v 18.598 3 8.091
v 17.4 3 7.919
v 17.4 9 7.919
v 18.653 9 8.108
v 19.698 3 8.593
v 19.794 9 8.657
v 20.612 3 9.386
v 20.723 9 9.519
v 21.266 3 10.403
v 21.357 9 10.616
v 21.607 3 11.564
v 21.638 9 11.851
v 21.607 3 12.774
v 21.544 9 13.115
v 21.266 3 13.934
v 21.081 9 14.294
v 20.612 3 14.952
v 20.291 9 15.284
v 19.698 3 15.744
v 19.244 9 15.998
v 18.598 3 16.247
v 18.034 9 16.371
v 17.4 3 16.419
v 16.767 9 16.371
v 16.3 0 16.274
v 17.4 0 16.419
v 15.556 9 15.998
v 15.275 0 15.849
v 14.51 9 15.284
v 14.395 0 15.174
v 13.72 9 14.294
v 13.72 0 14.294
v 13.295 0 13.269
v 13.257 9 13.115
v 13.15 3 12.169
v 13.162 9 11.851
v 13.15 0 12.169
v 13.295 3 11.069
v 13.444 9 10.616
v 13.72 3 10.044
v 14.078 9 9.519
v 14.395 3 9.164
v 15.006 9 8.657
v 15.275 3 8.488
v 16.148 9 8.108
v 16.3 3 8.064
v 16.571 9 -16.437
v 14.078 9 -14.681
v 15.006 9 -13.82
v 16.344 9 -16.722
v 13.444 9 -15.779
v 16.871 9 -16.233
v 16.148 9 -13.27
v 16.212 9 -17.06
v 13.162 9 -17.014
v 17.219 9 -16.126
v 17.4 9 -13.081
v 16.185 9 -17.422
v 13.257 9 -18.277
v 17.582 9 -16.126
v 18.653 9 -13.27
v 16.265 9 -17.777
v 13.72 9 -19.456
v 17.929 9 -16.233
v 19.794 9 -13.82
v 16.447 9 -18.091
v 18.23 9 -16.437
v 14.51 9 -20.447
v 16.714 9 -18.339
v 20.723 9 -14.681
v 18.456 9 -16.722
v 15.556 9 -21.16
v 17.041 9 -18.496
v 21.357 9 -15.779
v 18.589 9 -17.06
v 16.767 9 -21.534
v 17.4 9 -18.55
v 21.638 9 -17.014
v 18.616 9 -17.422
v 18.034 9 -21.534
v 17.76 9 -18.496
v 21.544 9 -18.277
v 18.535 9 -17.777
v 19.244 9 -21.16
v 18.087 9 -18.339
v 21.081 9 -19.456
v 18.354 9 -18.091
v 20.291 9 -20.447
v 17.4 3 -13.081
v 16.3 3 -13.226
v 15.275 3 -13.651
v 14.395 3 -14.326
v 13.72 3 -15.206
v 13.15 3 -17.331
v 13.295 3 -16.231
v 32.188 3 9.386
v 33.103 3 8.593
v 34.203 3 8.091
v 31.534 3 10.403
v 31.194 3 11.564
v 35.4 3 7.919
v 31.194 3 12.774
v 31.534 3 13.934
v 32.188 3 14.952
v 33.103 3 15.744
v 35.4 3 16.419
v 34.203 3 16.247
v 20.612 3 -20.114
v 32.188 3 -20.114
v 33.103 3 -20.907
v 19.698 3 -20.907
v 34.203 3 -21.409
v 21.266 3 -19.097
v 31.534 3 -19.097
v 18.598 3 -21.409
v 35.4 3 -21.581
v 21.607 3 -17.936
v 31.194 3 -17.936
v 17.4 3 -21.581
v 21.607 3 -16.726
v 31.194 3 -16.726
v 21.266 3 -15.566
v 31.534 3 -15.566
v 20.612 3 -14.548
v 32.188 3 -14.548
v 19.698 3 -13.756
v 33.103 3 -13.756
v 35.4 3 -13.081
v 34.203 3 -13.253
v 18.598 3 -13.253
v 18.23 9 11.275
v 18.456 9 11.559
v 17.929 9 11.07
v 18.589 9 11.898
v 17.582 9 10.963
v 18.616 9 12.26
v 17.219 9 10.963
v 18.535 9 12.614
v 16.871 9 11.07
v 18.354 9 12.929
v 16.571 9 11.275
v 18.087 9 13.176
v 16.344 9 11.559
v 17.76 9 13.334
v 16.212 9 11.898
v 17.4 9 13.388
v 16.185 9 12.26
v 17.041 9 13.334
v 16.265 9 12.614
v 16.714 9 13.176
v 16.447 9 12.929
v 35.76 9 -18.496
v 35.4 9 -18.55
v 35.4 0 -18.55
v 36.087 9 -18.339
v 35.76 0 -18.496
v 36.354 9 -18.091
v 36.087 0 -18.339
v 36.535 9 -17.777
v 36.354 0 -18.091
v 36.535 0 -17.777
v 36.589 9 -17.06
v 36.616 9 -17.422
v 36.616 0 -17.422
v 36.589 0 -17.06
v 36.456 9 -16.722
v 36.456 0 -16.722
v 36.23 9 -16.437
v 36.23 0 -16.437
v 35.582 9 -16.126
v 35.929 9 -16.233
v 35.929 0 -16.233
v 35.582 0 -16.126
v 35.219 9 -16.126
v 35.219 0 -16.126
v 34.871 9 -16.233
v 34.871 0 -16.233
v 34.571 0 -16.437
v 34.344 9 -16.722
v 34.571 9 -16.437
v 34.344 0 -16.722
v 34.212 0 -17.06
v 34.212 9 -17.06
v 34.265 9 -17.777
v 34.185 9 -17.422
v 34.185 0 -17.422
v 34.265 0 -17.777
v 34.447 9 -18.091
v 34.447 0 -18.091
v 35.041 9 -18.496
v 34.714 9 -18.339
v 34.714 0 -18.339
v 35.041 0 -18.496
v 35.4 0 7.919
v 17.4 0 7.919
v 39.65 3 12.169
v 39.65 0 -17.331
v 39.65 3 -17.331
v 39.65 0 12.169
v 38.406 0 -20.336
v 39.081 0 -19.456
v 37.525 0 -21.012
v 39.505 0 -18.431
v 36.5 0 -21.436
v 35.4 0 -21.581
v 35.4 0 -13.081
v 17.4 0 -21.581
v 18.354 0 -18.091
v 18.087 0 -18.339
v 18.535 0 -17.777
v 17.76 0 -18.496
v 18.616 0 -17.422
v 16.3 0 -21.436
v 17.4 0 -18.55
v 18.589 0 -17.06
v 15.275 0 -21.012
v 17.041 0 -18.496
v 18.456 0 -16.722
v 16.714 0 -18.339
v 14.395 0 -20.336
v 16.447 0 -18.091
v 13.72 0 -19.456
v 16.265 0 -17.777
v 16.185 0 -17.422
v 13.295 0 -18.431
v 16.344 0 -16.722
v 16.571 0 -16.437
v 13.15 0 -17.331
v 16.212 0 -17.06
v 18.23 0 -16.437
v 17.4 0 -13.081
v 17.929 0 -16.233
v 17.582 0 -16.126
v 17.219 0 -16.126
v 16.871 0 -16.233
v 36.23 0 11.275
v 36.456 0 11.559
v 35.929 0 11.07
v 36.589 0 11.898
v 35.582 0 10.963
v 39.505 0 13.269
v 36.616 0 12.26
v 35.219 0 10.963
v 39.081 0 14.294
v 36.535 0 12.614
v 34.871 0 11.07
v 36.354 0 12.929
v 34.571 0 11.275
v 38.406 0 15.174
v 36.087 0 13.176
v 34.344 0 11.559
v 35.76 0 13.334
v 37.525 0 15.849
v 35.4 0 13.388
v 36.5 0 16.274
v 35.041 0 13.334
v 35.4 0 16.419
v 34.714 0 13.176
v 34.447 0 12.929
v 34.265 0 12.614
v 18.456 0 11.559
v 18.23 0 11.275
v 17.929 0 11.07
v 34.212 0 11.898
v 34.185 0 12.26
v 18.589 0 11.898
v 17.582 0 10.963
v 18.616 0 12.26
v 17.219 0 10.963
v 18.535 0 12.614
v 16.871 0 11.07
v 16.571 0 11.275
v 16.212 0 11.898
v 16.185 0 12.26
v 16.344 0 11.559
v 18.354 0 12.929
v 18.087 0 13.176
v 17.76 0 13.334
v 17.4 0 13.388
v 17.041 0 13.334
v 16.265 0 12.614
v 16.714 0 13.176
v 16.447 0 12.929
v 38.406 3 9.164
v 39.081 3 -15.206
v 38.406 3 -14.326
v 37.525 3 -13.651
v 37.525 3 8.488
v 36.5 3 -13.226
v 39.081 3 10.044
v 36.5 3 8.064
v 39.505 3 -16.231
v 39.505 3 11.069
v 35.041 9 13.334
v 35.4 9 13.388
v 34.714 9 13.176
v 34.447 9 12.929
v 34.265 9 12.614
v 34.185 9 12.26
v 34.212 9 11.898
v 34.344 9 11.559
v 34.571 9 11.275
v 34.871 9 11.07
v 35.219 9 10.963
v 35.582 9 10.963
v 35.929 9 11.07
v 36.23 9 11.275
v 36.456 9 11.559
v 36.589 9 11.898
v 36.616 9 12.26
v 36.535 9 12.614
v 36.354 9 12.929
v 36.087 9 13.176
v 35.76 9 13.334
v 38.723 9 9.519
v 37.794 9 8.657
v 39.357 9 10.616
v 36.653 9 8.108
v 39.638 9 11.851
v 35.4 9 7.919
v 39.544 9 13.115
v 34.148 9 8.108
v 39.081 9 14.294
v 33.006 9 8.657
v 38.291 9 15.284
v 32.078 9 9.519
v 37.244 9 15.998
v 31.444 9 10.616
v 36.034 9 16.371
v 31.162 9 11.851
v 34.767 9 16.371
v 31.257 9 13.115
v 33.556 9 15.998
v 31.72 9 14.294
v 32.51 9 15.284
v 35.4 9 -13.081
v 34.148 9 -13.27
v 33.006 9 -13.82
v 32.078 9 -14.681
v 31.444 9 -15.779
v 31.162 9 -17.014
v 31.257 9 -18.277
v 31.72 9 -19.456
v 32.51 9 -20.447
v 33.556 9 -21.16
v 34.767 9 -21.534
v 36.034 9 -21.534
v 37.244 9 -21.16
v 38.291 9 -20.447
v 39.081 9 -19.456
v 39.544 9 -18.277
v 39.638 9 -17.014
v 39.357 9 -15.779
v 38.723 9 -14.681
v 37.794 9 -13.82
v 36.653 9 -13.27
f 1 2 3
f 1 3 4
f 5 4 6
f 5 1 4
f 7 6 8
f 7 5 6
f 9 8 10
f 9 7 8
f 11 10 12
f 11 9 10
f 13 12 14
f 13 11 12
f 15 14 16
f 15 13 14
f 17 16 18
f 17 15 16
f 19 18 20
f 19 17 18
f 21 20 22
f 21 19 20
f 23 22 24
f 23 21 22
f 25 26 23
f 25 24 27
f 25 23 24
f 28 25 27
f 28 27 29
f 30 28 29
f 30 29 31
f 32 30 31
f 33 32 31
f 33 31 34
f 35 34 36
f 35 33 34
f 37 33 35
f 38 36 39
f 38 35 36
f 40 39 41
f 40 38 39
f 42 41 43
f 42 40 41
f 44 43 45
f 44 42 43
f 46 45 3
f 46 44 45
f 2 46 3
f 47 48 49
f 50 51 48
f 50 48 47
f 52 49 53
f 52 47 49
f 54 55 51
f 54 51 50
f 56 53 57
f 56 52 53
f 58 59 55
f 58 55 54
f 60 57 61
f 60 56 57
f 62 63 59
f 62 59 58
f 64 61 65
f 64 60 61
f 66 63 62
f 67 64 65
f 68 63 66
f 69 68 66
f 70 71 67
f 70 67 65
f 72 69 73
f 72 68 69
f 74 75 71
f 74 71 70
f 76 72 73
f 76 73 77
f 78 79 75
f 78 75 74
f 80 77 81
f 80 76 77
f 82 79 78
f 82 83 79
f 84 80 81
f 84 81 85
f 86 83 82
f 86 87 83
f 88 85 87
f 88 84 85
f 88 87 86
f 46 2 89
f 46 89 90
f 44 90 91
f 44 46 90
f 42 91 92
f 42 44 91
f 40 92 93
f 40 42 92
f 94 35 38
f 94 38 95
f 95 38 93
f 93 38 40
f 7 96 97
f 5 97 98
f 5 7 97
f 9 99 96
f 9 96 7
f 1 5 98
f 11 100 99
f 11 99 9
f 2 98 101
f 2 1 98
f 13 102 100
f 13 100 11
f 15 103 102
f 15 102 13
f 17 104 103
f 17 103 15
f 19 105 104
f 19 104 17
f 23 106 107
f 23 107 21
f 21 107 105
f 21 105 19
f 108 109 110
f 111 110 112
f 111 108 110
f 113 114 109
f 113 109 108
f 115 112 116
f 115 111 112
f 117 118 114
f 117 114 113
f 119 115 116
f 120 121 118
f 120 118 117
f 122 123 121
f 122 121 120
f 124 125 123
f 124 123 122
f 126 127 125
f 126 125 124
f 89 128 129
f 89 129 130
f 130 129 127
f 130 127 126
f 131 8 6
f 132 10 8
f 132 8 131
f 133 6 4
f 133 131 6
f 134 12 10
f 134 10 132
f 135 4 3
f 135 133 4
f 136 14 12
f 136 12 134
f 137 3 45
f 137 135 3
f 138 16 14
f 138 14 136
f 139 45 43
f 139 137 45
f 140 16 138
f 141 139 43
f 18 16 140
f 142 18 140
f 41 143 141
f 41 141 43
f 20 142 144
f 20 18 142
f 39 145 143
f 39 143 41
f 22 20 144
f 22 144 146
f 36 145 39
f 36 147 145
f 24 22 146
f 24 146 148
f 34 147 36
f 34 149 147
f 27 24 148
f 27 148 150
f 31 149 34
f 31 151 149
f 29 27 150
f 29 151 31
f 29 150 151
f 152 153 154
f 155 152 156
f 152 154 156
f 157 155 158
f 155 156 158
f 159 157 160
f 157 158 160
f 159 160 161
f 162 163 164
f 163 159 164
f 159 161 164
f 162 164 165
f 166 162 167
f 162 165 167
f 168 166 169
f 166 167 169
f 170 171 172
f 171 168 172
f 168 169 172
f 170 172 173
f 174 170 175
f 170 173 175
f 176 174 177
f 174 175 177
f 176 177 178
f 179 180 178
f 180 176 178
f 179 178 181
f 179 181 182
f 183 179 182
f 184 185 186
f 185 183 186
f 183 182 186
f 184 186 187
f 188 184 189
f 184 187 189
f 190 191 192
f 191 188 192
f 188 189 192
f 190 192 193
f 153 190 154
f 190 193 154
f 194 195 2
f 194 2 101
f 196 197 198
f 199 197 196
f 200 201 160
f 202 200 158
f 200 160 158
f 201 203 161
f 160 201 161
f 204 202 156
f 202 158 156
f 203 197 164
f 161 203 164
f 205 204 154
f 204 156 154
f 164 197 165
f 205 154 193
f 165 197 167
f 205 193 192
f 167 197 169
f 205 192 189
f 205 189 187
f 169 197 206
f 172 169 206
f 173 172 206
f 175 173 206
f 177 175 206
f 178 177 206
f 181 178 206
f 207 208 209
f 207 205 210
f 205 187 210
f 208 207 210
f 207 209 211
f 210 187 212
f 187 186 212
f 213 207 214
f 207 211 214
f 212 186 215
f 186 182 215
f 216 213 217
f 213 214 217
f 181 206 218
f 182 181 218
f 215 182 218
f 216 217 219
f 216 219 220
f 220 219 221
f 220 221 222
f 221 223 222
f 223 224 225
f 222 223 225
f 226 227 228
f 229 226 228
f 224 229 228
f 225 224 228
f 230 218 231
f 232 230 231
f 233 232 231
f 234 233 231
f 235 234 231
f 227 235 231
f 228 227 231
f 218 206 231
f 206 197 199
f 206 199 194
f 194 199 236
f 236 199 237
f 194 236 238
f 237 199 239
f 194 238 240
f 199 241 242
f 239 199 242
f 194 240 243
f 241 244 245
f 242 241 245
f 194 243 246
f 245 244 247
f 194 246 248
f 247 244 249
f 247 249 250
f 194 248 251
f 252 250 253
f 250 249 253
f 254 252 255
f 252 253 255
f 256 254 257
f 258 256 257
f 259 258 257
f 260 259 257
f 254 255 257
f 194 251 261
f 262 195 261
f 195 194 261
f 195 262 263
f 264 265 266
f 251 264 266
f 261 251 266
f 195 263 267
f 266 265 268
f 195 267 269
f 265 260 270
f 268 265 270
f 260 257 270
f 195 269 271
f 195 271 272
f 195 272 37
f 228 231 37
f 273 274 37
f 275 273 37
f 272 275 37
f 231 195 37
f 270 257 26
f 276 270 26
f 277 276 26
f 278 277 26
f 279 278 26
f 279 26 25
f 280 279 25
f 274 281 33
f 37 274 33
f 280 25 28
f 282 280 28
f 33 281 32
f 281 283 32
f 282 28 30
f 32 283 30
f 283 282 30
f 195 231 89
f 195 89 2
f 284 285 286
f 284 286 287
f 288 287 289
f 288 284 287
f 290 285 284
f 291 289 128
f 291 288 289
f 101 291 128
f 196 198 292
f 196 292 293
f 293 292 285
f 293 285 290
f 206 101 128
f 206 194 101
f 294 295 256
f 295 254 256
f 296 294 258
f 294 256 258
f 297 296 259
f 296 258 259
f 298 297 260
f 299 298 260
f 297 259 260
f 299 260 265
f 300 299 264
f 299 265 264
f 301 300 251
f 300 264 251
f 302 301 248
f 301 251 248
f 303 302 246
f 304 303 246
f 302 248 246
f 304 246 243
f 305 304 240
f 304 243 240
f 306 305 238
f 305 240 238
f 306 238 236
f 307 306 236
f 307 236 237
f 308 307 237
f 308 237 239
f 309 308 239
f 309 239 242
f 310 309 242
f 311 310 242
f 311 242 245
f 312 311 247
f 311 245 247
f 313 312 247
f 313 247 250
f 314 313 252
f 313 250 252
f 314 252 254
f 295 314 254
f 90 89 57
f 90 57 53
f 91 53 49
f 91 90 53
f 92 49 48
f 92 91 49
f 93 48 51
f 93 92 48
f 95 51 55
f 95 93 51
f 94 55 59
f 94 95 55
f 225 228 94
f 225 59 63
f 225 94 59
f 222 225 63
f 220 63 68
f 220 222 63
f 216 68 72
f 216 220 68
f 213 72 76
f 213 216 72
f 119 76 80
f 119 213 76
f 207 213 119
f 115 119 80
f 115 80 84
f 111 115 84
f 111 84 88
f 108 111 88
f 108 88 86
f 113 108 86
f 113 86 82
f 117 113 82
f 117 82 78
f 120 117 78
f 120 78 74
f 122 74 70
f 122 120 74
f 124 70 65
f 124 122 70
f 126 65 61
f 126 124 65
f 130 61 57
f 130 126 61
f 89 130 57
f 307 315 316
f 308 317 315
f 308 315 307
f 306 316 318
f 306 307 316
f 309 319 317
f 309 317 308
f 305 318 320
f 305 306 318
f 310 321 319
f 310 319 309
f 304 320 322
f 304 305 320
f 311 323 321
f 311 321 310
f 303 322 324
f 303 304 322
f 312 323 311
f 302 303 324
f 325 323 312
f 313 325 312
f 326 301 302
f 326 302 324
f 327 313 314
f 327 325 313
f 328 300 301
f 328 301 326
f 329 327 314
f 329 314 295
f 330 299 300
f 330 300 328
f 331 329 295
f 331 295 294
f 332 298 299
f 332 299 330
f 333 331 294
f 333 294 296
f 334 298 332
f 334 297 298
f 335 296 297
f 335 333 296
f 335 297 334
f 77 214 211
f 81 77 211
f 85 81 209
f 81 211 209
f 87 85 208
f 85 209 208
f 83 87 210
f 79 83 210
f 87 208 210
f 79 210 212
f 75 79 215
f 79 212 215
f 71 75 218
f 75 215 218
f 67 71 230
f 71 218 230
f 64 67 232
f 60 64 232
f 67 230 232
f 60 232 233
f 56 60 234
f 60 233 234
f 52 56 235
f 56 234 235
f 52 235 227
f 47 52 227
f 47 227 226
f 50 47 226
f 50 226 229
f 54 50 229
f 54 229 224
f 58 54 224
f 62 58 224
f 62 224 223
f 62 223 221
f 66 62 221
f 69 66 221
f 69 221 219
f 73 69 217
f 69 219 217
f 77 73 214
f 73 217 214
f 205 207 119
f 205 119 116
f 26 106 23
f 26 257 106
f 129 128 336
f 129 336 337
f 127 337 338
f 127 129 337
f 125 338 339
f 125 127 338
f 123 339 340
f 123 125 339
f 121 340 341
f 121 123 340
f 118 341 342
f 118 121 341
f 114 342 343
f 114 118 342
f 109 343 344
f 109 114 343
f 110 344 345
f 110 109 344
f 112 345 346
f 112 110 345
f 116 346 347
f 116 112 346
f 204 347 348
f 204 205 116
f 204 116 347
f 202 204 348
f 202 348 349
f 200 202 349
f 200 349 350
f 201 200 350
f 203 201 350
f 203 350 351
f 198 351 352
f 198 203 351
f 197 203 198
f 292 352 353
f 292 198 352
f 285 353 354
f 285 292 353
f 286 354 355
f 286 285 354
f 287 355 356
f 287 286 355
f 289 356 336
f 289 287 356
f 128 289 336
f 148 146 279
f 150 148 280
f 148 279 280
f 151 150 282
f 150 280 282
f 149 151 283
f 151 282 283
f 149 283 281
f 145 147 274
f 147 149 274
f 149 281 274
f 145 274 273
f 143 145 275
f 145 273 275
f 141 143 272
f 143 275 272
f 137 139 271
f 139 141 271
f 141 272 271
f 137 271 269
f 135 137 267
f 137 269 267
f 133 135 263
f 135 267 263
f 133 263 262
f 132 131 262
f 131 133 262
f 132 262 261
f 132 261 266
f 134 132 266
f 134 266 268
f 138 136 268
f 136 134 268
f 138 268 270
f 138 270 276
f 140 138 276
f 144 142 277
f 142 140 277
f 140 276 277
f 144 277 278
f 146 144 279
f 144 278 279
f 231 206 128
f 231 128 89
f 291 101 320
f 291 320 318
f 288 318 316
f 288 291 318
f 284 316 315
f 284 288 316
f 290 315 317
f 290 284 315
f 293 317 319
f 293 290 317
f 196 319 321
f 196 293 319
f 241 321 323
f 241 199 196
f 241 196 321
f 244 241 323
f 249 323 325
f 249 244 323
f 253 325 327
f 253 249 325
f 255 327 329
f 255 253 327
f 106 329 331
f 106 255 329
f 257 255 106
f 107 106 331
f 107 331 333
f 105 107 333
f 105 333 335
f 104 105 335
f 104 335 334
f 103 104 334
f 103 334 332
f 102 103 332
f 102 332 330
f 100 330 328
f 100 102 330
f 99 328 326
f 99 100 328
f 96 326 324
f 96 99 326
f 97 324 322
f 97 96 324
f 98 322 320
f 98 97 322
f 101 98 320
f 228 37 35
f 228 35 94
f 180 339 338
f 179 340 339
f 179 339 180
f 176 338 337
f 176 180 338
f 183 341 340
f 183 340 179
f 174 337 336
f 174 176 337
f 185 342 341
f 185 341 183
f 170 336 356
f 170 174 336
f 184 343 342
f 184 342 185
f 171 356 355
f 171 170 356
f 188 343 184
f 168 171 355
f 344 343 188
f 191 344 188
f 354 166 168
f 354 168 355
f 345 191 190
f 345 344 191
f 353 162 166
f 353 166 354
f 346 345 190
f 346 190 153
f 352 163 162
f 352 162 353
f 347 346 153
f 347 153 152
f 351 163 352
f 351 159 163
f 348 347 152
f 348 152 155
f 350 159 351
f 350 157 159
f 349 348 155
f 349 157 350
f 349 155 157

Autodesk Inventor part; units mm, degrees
ref_plane "YZ Plane" through (0, 0, 0) normal (1, 0, 0) x (0, 1, 0)
ref_plane "XZ Plane" through (0, 0, 0) normal (0, 1, 0) x (-1, 0, 0)
ref_plane "XY Plane" through (0, 0, 0) normal (0, 0, 1) x (1, 0, 0)
sketch "Sketch1" plane through (0, 0, 0) normal (0, 1, 0) x (-1, 0, 0)
  arc A0 (-31.1503, 12.1688) -> (-35.4003, 7.9188) centre (-35.4003, 12.1688) ccw
  line L0 (-35.4003, 16.4188) -> (-35.4003, -2.5812)
  line L1 (-39.6503, 12.1688) -> (-31.1503, 12.1688)
  line L2 (-39.6503, -2.5812) -> (-39.6503, 12.1688)
  line L3 (-35.4003, 12.1688) -> (-26.4003, 12.1688)
  line L4 (-35.4003, 16.4188) -> (-26.4003, 16.4188)
  line L5 (-26.4003, 16.4188) -> (-26.4003, 7.9188)
  line L6 (-26.4003, 7.9188) -> (-35.4003, 7.9188)
  line L7 (-35.4003, 7.9188) -> (-35.4003, 16.4188)
  arc A1 (-35.4003, 7.9188) -> (-31.1503, 12.1688) centre (-35.4003, 12.1688) ccw
  line L8 (-35.4003, -2.5812) -> (-39.6503, -2.5812)
  point P0 (0, 0)
  dimension "d0" = 8.5
  dimension "d3" = 19
  dimension "d4" = 9
extrude "Extrusion2" add sketch "Sketch1" along normal blind 3
extrude "Extrusion3" add sketch "Sketch1" along normal blind 9 contours L1 L0 A0 | A1 L0 L1 | L0 L1 A0 | L0 A0 L1
sketch "Sketch2" plane through (35.4003, 9, 12.1688) normal (0, 1, 0) x (1, 0, 0)
  circle A0 centre (0, 0) radius 4.25 projected
  circle A1 centre (0, 0) radius 4.25
  point P0 (-35.4003, 12.1688)
hole "Hole1" at (35.4003, 9, 12.1688) direction (0, -1, 0) diameter 2.4384 end through all
mirror "Mirror1" about plane through (39.6503, 0, -2.5812) normal (0, 0, -1) of "Extrusion2", "Extrusion3", "Hole1"
mirror "Mirror2" about plane through (26.4003, 0, -13.0812) normal (-1, 0, 0) of "Extrusion2", "Extrusion3", "Hole1", "Mirror1"
properties part number "Spacer"
